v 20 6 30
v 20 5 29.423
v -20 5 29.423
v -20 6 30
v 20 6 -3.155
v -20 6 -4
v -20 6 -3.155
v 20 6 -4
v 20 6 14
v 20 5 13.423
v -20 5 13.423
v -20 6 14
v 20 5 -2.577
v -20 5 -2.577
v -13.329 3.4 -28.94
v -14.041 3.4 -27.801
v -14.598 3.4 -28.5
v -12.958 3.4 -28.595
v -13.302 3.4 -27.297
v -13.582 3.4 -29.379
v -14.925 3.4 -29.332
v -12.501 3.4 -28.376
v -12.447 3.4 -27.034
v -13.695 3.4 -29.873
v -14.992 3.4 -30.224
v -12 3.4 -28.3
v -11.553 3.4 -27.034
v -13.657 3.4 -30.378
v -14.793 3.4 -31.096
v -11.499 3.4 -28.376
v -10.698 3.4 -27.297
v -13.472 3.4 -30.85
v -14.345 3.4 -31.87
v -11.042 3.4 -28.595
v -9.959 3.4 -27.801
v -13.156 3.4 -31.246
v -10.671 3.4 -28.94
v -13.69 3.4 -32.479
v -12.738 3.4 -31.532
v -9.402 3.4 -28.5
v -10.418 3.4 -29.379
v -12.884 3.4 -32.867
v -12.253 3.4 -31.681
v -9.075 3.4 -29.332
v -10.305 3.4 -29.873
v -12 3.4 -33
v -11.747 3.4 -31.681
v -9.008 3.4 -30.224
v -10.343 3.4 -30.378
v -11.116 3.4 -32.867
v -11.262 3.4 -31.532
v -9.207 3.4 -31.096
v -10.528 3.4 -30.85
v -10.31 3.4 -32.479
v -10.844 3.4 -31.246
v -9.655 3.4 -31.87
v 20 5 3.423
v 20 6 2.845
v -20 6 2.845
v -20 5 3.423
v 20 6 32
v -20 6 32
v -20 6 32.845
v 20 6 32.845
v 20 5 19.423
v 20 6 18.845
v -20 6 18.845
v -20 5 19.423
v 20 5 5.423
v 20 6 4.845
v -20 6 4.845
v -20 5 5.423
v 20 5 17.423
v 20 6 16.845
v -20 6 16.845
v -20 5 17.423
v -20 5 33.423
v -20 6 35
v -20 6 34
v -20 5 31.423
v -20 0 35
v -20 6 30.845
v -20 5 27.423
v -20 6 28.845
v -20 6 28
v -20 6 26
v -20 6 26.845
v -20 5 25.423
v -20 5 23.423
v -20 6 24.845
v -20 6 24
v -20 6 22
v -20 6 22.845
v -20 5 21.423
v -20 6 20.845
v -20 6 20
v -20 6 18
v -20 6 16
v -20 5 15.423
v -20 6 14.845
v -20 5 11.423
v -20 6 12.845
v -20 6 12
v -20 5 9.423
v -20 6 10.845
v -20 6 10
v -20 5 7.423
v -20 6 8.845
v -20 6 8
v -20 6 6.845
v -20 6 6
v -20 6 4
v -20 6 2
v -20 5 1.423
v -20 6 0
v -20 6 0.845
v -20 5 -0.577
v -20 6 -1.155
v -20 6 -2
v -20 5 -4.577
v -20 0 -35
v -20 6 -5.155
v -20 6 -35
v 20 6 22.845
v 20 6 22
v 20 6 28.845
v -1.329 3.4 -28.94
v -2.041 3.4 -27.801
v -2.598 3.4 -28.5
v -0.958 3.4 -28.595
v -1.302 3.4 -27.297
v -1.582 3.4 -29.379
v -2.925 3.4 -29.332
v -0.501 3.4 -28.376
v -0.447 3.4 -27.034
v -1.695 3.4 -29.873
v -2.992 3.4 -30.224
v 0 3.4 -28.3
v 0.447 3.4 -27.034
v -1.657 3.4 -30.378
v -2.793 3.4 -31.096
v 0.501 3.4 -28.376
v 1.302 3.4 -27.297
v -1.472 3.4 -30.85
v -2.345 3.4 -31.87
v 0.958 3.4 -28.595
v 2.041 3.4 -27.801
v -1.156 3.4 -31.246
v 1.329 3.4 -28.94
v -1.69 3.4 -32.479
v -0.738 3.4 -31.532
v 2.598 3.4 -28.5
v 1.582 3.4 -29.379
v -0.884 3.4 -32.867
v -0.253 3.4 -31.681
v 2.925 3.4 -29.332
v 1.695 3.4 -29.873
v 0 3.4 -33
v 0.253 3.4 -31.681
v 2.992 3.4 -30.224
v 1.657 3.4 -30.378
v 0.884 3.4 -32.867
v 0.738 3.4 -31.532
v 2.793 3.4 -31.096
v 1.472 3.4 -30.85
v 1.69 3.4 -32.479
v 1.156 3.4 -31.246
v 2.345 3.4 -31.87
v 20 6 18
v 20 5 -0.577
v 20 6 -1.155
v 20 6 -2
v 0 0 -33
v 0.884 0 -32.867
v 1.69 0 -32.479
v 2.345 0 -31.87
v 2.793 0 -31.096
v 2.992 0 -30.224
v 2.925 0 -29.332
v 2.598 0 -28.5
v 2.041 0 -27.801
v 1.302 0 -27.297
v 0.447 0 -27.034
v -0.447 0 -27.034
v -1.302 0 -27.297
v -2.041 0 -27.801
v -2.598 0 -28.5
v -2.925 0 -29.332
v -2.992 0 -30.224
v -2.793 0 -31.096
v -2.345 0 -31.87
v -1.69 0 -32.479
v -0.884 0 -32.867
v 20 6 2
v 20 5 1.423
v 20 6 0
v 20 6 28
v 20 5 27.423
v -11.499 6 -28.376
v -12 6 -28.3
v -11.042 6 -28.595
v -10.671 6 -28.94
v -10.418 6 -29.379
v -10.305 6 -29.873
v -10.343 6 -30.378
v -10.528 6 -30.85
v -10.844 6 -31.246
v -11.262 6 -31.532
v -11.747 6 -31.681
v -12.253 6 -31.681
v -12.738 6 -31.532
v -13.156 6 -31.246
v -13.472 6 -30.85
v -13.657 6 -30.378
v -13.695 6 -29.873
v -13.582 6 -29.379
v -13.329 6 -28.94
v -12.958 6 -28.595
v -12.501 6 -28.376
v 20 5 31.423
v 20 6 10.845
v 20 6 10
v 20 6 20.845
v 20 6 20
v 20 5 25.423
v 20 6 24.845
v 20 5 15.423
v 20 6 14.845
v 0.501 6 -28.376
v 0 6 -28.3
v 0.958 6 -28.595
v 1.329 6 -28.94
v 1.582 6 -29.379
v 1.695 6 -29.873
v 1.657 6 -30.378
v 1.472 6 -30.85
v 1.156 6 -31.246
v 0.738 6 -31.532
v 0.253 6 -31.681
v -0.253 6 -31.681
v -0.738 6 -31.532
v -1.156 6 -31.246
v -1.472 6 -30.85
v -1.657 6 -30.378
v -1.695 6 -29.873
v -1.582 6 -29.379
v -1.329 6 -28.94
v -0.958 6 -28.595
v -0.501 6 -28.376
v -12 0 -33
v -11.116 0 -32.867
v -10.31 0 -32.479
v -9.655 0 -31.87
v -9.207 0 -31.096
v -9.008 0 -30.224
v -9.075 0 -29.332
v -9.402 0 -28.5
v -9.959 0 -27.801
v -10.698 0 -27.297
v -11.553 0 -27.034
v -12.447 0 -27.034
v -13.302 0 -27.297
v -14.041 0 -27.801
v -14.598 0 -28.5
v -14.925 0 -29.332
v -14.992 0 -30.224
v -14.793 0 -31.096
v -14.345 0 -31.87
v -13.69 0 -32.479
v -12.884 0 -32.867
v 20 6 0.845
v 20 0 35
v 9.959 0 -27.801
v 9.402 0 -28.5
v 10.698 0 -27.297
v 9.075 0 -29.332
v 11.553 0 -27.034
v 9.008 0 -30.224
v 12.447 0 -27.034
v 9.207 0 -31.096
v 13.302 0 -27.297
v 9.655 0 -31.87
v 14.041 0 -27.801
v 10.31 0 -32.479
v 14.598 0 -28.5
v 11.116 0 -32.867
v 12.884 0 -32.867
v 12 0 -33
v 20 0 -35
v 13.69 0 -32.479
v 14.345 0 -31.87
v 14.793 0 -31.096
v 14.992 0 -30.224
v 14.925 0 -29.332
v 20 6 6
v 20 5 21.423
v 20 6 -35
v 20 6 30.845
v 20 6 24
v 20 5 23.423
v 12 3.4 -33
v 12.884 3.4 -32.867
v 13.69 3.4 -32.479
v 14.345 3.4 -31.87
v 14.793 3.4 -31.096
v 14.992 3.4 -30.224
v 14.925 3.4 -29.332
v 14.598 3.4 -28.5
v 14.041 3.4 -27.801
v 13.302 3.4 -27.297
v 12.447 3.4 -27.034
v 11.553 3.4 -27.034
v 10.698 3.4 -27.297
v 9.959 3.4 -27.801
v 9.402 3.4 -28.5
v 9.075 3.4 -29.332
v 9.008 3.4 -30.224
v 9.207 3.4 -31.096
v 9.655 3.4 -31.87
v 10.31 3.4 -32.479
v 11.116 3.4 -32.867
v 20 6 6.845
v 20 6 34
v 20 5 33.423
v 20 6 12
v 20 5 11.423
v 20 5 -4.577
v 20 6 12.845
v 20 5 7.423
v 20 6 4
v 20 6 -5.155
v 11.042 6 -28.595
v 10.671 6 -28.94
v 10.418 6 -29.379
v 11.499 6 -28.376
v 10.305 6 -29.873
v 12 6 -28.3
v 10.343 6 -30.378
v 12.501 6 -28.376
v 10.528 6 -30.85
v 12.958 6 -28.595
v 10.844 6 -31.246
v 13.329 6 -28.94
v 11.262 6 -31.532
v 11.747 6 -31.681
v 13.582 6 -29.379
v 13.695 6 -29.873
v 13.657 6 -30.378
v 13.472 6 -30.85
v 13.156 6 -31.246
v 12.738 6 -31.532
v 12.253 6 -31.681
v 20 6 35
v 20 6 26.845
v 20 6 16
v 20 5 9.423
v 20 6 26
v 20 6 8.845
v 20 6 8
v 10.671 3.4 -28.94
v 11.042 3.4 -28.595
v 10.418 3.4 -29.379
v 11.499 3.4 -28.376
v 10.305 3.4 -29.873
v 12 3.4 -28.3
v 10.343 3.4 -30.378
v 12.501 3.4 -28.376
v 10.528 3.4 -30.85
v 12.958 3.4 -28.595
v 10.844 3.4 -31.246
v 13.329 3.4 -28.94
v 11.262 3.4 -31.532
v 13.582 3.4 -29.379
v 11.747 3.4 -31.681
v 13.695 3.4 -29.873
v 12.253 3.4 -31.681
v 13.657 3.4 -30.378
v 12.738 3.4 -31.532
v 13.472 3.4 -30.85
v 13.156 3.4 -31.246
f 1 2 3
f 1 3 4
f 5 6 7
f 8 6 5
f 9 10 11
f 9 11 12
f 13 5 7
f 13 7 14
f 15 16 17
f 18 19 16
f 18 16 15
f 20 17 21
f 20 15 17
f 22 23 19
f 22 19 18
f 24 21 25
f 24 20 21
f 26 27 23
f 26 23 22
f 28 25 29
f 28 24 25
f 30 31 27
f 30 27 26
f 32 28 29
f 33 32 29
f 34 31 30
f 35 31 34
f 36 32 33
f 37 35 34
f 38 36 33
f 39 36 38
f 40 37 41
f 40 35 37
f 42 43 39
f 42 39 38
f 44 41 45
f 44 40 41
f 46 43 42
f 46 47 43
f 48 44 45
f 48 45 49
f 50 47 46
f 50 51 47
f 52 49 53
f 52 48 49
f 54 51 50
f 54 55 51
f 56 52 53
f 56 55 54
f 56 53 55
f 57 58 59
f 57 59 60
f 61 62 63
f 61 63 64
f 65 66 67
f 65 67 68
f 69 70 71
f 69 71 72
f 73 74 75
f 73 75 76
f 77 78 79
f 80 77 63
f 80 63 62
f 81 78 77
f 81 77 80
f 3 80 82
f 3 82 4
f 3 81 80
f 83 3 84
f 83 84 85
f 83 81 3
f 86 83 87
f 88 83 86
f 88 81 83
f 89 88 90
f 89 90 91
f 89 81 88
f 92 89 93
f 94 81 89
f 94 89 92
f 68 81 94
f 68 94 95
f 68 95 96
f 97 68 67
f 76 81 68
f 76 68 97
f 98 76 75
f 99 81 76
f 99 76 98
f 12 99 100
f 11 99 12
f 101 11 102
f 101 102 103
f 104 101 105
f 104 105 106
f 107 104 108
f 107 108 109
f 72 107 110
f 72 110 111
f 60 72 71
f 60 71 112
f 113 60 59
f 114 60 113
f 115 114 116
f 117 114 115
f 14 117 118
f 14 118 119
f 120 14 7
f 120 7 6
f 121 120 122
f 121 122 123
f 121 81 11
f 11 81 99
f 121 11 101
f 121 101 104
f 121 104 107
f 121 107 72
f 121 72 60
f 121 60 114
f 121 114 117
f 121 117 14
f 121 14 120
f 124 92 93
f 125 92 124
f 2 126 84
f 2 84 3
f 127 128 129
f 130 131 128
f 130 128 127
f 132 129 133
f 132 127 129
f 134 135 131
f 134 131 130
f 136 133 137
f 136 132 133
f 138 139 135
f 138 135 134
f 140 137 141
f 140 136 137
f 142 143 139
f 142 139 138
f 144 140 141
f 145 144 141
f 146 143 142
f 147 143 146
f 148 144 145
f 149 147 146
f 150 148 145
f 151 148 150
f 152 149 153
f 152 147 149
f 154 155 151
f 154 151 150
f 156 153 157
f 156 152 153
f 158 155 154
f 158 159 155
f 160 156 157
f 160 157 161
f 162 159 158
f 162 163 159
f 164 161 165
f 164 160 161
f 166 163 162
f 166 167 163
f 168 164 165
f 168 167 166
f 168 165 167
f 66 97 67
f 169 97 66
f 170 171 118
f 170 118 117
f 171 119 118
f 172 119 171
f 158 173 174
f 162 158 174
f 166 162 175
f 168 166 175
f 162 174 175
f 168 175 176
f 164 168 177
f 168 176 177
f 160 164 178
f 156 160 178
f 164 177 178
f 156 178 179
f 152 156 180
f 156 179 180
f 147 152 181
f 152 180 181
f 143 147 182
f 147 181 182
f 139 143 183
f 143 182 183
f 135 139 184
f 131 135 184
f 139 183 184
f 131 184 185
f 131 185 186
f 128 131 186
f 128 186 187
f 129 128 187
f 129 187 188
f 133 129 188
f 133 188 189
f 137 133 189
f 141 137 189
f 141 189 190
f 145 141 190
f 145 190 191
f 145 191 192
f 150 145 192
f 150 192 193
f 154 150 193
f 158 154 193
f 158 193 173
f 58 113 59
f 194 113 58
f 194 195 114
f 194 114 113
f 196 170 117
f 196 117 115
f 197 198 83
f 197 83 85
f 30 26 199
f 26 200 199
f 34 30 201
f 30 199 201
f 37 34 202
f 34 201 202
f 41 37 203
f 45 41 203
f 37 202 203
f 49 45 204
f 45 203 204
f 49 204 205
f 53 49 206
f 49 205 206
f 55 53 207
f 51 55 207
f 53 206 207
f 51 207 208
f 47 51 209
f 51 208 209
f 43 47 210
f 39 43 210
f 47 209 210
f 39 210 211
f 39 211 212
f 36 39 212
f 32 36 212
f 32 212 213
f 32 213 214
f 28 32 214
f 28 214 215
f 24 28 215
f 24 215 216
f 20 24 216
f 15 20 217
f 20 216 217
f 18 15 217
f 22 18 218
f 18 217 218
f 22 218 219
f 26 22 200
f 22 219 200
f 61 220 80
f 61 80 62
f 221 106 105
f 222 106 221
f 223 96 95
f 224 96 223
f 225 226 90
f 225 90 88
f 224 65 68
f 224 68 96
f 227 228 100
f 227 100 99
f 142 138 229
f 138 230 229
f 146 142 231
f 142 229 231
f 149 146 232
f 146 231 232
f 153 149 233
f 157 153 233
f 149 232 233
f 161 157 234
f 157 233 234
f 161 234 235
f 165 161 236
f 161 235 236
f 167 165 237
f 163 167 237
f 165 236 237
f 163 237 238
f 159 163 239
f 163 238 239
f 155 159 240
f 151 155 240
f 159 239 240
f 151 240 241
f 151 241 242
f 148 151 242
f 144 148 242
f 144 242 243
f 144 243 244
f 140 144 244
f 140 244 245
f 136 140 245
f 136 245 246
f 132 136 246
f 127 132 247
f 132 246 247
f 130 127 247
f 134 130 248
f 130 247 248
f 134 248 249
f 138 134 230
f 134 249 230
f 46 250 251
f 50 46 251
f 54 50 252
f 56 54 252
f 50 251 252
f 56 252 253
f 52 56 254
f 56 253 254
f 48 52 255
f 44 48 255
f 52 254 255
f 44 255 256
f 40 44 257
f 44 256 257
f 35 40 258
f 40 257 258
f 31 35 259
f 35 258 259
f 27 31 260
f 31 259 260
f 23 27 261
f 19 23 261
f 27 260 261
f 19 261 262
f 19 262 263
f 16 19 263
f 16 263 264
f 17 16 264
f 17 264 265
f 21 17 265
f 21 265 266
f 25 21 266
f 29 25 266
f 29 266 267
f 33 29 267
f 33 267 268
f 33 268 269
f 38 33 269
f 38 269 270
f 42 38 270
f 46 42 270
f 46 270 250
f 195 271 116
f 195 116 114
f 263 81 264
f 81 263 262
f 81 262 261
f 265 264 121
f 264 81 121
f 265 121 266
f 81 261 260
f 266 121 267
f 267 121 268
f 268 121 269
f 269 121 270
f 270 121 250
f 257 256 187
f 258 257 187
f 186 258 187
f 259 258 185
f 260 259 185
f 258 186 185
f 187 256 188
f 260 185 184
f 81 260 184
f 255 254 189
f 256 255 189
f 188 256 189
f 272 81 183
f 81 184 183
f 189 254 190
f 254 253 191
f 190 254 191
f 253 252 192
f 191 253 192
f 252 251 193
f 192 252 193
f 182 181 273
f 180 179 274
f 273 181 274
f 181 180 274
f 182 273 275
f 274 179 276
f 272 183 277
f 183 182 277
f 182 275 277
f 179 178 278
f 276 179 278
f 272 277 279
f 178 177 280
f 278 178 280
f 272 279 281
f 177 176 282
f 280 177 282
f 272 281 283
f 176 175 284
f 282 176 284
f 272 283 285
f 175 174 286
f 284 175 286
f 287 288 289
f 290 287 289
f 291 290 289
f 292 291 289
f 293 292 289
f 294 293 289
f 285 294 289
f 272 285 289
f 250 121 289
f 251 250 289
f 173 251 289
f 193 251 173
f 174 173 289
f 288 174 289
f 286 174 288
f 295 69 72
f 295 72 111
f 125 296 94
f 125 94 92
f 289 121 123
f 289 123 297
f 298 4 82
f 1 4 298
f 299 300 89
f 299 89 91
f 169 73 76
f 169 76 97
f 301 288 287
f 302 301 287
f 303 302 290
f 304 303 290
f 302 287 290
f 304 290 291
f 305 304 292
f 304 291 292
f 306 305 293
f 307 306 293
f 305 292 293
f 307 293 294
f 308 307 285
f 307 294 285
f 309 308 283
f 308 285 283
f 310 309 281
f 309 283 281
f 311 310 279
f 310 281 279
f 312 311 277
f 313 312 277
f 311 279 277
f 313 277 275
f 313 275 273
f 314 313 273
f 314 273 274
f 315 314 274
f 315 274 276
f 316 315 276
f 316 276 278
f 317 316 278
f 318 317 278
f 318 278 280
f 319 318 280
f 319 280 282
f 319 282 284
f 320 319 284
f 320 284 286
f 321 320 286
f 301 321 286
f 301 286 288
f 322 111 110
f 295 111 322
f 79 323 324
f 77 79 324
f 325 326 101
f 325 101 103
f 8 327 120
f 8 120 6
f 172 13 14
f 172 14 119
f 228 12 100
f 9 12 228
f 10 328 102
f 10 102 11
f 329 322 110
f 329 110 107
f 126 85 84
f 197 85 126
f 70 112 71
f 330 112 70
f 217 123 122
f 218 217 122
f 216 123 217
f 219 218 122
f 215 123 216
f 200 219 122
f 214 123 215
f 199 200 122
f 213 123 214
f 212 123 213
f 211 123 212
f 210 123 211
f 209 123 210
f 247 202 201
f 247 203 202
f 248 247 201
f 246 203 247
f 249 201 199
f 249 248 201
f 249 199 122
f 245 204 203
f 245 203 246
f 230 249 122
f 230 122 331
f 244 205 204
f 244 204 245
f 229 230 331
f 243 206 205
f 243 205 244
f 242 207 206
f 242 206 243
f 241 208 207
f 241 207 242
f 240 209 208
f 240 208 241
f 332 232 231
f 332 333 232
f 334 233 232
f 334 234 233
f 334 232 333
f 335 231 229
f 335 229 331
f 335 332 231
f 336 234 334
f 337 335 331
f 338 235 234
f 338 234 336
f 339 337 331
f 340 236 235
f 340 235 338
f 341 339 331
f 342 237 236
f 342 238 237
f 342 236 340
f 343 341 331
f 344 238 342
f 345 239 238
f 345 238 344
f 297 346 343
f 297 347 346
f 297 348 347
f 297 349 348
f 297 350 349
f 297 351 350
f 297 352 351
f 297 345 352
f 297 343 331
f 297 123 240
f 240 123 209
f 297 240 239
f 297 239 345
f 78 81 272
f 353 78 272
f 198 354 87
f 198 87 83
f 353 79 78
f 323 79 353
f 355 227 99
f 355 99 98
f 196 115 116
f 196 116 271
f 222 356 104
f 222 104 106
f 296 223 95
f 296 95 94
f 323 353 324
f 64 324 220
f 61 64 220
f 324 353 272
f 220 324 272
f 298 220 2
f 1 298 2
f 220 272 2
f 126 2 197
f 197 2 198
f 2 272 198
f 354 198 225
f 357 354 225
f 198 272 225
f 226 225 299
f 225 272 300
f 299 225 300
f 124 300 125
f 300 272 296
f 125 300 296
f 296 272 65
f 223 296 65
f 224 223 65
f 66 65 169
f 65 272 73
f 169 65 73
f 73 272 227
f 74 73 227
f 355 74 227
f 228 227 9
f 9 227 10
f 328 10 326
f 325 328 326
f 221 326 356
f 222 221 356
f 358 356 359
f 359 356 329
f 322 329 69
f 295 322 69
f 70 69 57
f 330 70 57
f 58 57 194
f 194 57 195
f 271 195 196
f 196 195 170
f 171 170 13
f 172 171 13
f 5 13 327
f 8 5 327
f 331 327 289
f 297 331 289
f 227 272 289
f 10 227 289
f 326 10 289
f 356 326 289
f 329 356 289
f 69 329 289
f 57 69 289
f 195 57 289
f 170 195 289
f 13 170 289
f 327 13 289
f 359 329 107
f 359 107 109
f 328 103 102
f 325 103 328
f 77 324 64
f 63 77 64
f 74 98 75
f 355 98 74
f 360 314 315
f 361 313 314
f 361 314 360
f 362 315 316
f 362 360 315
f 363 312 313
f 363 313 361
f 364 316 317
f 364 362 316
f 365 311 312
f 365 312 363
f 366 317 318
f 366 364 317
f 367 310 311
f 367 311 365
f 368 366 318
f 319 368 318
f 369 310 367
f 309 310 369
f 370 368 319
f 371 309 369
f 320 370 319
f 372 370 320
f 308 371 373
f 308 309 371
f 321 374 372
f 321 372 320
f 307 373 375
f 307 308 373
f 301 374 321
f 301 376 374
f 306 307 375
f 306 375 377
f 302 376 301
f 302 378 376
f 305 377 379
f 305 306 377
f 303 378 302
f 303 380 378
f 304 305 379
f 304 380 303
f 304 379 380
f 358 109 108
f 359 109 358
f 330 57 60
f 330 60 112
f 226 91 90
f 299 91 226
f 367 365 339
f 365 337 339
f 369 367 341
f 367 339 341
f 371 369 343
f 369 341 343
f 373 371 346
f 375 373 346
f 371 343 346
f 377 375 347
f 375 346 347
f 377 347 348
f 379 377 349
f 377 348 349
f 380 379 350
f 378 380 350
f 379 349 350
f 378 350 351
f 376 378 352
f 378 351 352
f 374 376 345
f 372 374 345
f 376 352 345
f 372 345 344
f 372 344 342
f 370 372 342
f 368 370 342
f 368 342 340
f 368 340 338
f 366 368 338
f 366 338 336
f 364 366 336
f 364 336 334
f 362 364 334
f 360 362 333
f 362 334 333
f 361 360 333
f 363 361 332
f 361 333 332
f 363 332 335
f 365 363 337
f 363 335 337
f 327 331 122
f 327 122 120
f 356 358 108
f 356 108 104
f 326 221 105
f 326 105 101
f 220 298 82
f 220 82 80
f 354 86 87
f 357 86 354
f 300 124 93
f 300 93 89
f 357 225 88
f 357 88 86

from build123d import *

# Parameters (mm, degrees)
SKETCH_1_W                = 40
SKETCH_1_H                = 70
EXTRUDE_1_DEPTH           = 6
CUT_EXTRUDE_1_DEPTH       = 54.488316481
HOLE_WIZARD_2_D           = 3.4
HOLE_WIZARD_2_CBORE_D     = 6
HOLE_WIZARD_2_CBORE_DEPTH = 3.4


with BuildPart() as part:
    # 草图1 → 凸台-拉伸1 (new body)
    with BuildSketch(Plane(origin=(0, 0, 0), x_dir=(1, 0, 0), z_dir=(0, 1, 0))):
        Rectangle(SKETCH_1_W, SKETCH_1_H)
    extrude(amount=EXTRUDE_1_DEPTH)

    # 草图4 → 切除-拉伸1 (cut, through all)
    with BuildSketch(Plane(origin=(20, 0, 0), x_dir=(0, 0, -1), z_dir=(1, 0, 0))):
        Polygon((-34, 6), (-33.422649731, 5), (-32.845299462, 6), align=None)
        Polygon((-32, 6), (-30.845299462, 6), (-31.422649731, 5), align=None)
        Polygon((-30, 6), (-28.845299462, 6), (-29.422649731, 5), align=None)
        Polygon((-28, 6), (-26.845299462, 6), (-27.422649731, 5), align=None)
        Polygon((-26, 6), (-24.845299462, 6), (-25.422649731, 5), align=None)
        Polygon((-24, 6), (-22.845299462, 6), (-23.422649731, 5), align=None)
        Polygon((-22, 6), (-20.845299462, 6), (-21.422649731, 5), align=None)
        Polygon((-20, 6), (-18.845299462, 6), (-19.422649731, 5), align=None)
        Polygon((-18, 6), (-16.845299462, 6), (-17.422649731, 5), align=None)
        Polygon((-16, 6), (-14.845299462, 6), (-15.422649731, 5), align=None)
        Polygon((-14, 6), (-12.845299462, 6), (-13.422649731, 5), align=None)
        Polygon((-12, 6), (-10.845299462, 6), (-11.422649731, 5), align=None)
        Polygon((-10, 6), (-8.845299462, 6), (-9.422649731, 5), align=None)
        Polygon((-8, 6), (-6.845299462, 6), (-7.422649731, 5), align=None)
        Polygon((-6, 6), (-4.845299462, 6), (-5.422649731, 5), align=None)
        Polygon((-4, 6), (-2.845299462, 6), (-3.422649731, 5), align=None)
        Polygon((-2, 6), (-0.845299462, 6), (-1.422649731, 5), align=None)
        Polygon((0, 6), (1.154700538, 6), (0.577350269, 5), align=None)
        Polygon((2, 6), (3.154700538, 6), (2.577350269, 5), align=None)
        Polygon((4, 6), (5.154700538, 6), (4.577350269, 5), align=None)
    extrude(amount=-CUT_EXTRUDE_1_DEPTH, mode=Mode.SUBTRACT)

    # 打孔尺寸(%根据)内六角圆柱头螺钉的类型2 (through all)
    with Locations(Plane(origin=(-12, 0, -30), x_dir=(0, 0, -1), z_dir=(0, -1, 0))):
        with Locations((0, 0), (0, 12), (0, 24)):
            CounterBoreHole(HOLE_WIZARD_2_D / 2, HOLE_WIZARD_2_CBORE_D / 2, HOLE_WIZARD_2_CBORE_DEPTH)


solid = part.part
